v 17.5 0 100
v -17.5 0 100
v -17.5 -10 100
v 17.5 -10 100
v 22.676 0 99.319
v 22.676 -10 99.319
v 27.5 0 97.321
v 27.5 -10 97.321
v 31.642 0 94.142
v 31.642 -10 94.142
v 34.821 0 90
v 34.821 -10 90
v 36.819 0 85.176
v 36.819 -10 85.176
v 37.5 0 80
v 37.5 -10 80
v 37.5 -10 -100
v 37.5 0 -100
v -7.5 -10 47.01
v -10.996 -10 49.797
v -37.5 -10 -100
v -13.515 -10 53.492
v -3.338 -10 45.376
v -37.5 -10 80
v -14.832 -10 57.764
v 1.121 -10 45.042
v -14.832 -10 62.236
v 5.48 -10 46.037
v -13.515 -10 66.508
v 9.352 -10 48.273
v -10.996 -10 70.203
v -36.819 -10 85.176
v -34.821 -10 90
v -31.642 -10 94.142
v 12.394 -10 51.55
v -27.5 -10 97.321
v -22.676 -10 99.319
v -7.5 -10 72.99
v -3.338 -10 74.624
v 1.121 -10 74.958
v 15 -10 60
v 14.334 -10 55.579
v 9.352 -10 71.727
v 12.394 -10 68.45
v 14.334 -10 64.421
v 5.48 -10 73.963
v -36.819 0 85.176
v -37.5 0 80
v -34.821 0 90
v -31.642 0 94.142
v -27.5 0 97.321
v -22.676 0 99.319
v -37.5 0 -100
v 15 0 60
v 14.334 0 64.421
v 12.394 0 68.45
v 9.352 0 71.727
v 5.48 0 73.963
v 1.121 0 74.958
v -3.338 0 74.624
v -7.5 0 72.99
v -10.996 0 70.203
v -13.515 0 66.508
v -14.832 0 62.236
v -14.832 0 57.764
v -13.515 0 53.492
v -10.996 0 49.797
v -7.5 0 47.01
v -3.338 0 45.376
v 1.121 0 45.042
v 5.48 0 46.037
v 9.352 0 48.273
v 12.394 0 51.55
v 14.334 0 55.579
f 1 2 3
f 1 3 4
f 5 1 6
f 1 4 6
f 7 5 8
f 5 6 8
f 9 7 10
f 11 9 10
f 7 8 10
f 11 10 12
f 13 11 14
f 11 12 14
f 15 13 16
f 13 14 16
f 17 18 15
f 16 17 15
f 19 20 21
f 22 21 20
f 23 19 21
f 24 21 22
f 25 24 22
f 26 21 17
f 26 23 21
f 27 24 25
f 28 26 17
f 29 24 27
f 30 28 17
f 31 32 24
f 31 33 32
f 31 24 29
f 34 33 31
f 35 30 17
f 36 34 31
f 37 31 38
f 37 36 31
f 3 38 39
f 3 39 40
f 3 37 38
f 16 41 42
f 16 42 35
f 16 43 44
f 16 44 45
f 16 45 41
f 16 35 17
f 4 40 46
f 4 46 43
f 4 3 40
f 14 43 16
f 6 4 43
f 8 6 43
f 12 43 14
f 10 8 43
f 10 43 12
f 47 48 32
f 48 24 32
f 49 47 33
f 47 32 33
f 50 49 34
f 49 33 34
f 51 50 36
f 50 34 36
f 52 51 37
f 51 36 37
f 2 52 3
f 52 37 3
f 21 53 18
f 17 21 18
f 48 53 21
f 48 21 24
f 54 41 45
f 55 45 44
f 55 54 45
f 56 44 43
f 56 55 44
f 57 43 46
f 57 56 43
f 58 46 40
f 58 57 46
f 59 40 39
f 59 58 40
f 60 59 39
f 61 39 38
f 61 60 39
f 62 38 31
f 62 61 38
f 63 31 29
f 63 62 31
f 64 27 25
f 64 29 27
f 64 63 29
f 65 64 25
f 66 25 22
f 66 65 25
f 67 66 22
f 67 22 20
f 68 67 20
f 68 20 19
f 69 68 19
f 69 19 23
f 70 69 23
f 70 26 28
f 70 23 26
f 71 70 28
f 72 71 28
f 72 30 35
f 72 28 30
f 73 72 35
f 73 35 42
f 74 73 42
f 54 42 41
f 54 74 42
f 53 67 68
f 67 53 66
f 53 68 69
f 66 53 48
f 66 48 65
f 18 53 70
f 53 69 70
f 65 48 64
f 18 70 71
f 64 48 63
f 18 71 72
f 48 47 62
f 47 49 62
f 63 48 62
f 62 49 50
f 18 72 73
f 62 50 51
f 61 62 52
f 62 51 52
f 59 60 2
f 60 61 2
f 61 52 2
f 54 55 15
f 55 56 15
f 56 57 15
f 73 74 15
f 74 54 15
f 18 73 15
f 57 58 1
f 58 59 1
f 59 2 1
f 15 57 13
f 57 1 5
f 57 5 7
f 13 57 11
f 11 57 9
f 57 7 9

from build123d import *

# Parameters (mm, degrees)
F0_W          = 75
F0_H          = 200
F1_DEPTH      = 10
F2_R          = 15
F3_DEPTH      = 219
F3_DEPTH_BACK = 25
F4_R          = 20


# Not quite as in the source:
# - an extrude ends at something that could not be found from the text; its depth is read off the source's solid


with BuildPart() as f1:
    # F0 (on Front) → F1 (new body)
    with BuildSketch(Plane.XZ):
        Rectangle(F0_W, F0_H)
    extrude(amount=F1_DEPTH)

    # F2 (on Front) → F3 (cut, two sides)
    with BuildSketch(Plane.XZ) as f3_sk:
        with Locations((0, 60)):
            Circle(F2_R)
    extrude(amount=-F3_DEPTH, mode=Mode.SUBTRACT)
    extrude(f3_sk.sketch, amount=F3_DEPTH_BACK, mode=Mode.SUBTRACT)

    # F4
    f4_edges = [f1.edges().sort_by_distance(p)[0] for p in [
        (-37.5, -5, 100),
        (37.5, -5, 100),
    ]]
    fillet(f4_edges, radius=F4_R)


solid = f1.part
